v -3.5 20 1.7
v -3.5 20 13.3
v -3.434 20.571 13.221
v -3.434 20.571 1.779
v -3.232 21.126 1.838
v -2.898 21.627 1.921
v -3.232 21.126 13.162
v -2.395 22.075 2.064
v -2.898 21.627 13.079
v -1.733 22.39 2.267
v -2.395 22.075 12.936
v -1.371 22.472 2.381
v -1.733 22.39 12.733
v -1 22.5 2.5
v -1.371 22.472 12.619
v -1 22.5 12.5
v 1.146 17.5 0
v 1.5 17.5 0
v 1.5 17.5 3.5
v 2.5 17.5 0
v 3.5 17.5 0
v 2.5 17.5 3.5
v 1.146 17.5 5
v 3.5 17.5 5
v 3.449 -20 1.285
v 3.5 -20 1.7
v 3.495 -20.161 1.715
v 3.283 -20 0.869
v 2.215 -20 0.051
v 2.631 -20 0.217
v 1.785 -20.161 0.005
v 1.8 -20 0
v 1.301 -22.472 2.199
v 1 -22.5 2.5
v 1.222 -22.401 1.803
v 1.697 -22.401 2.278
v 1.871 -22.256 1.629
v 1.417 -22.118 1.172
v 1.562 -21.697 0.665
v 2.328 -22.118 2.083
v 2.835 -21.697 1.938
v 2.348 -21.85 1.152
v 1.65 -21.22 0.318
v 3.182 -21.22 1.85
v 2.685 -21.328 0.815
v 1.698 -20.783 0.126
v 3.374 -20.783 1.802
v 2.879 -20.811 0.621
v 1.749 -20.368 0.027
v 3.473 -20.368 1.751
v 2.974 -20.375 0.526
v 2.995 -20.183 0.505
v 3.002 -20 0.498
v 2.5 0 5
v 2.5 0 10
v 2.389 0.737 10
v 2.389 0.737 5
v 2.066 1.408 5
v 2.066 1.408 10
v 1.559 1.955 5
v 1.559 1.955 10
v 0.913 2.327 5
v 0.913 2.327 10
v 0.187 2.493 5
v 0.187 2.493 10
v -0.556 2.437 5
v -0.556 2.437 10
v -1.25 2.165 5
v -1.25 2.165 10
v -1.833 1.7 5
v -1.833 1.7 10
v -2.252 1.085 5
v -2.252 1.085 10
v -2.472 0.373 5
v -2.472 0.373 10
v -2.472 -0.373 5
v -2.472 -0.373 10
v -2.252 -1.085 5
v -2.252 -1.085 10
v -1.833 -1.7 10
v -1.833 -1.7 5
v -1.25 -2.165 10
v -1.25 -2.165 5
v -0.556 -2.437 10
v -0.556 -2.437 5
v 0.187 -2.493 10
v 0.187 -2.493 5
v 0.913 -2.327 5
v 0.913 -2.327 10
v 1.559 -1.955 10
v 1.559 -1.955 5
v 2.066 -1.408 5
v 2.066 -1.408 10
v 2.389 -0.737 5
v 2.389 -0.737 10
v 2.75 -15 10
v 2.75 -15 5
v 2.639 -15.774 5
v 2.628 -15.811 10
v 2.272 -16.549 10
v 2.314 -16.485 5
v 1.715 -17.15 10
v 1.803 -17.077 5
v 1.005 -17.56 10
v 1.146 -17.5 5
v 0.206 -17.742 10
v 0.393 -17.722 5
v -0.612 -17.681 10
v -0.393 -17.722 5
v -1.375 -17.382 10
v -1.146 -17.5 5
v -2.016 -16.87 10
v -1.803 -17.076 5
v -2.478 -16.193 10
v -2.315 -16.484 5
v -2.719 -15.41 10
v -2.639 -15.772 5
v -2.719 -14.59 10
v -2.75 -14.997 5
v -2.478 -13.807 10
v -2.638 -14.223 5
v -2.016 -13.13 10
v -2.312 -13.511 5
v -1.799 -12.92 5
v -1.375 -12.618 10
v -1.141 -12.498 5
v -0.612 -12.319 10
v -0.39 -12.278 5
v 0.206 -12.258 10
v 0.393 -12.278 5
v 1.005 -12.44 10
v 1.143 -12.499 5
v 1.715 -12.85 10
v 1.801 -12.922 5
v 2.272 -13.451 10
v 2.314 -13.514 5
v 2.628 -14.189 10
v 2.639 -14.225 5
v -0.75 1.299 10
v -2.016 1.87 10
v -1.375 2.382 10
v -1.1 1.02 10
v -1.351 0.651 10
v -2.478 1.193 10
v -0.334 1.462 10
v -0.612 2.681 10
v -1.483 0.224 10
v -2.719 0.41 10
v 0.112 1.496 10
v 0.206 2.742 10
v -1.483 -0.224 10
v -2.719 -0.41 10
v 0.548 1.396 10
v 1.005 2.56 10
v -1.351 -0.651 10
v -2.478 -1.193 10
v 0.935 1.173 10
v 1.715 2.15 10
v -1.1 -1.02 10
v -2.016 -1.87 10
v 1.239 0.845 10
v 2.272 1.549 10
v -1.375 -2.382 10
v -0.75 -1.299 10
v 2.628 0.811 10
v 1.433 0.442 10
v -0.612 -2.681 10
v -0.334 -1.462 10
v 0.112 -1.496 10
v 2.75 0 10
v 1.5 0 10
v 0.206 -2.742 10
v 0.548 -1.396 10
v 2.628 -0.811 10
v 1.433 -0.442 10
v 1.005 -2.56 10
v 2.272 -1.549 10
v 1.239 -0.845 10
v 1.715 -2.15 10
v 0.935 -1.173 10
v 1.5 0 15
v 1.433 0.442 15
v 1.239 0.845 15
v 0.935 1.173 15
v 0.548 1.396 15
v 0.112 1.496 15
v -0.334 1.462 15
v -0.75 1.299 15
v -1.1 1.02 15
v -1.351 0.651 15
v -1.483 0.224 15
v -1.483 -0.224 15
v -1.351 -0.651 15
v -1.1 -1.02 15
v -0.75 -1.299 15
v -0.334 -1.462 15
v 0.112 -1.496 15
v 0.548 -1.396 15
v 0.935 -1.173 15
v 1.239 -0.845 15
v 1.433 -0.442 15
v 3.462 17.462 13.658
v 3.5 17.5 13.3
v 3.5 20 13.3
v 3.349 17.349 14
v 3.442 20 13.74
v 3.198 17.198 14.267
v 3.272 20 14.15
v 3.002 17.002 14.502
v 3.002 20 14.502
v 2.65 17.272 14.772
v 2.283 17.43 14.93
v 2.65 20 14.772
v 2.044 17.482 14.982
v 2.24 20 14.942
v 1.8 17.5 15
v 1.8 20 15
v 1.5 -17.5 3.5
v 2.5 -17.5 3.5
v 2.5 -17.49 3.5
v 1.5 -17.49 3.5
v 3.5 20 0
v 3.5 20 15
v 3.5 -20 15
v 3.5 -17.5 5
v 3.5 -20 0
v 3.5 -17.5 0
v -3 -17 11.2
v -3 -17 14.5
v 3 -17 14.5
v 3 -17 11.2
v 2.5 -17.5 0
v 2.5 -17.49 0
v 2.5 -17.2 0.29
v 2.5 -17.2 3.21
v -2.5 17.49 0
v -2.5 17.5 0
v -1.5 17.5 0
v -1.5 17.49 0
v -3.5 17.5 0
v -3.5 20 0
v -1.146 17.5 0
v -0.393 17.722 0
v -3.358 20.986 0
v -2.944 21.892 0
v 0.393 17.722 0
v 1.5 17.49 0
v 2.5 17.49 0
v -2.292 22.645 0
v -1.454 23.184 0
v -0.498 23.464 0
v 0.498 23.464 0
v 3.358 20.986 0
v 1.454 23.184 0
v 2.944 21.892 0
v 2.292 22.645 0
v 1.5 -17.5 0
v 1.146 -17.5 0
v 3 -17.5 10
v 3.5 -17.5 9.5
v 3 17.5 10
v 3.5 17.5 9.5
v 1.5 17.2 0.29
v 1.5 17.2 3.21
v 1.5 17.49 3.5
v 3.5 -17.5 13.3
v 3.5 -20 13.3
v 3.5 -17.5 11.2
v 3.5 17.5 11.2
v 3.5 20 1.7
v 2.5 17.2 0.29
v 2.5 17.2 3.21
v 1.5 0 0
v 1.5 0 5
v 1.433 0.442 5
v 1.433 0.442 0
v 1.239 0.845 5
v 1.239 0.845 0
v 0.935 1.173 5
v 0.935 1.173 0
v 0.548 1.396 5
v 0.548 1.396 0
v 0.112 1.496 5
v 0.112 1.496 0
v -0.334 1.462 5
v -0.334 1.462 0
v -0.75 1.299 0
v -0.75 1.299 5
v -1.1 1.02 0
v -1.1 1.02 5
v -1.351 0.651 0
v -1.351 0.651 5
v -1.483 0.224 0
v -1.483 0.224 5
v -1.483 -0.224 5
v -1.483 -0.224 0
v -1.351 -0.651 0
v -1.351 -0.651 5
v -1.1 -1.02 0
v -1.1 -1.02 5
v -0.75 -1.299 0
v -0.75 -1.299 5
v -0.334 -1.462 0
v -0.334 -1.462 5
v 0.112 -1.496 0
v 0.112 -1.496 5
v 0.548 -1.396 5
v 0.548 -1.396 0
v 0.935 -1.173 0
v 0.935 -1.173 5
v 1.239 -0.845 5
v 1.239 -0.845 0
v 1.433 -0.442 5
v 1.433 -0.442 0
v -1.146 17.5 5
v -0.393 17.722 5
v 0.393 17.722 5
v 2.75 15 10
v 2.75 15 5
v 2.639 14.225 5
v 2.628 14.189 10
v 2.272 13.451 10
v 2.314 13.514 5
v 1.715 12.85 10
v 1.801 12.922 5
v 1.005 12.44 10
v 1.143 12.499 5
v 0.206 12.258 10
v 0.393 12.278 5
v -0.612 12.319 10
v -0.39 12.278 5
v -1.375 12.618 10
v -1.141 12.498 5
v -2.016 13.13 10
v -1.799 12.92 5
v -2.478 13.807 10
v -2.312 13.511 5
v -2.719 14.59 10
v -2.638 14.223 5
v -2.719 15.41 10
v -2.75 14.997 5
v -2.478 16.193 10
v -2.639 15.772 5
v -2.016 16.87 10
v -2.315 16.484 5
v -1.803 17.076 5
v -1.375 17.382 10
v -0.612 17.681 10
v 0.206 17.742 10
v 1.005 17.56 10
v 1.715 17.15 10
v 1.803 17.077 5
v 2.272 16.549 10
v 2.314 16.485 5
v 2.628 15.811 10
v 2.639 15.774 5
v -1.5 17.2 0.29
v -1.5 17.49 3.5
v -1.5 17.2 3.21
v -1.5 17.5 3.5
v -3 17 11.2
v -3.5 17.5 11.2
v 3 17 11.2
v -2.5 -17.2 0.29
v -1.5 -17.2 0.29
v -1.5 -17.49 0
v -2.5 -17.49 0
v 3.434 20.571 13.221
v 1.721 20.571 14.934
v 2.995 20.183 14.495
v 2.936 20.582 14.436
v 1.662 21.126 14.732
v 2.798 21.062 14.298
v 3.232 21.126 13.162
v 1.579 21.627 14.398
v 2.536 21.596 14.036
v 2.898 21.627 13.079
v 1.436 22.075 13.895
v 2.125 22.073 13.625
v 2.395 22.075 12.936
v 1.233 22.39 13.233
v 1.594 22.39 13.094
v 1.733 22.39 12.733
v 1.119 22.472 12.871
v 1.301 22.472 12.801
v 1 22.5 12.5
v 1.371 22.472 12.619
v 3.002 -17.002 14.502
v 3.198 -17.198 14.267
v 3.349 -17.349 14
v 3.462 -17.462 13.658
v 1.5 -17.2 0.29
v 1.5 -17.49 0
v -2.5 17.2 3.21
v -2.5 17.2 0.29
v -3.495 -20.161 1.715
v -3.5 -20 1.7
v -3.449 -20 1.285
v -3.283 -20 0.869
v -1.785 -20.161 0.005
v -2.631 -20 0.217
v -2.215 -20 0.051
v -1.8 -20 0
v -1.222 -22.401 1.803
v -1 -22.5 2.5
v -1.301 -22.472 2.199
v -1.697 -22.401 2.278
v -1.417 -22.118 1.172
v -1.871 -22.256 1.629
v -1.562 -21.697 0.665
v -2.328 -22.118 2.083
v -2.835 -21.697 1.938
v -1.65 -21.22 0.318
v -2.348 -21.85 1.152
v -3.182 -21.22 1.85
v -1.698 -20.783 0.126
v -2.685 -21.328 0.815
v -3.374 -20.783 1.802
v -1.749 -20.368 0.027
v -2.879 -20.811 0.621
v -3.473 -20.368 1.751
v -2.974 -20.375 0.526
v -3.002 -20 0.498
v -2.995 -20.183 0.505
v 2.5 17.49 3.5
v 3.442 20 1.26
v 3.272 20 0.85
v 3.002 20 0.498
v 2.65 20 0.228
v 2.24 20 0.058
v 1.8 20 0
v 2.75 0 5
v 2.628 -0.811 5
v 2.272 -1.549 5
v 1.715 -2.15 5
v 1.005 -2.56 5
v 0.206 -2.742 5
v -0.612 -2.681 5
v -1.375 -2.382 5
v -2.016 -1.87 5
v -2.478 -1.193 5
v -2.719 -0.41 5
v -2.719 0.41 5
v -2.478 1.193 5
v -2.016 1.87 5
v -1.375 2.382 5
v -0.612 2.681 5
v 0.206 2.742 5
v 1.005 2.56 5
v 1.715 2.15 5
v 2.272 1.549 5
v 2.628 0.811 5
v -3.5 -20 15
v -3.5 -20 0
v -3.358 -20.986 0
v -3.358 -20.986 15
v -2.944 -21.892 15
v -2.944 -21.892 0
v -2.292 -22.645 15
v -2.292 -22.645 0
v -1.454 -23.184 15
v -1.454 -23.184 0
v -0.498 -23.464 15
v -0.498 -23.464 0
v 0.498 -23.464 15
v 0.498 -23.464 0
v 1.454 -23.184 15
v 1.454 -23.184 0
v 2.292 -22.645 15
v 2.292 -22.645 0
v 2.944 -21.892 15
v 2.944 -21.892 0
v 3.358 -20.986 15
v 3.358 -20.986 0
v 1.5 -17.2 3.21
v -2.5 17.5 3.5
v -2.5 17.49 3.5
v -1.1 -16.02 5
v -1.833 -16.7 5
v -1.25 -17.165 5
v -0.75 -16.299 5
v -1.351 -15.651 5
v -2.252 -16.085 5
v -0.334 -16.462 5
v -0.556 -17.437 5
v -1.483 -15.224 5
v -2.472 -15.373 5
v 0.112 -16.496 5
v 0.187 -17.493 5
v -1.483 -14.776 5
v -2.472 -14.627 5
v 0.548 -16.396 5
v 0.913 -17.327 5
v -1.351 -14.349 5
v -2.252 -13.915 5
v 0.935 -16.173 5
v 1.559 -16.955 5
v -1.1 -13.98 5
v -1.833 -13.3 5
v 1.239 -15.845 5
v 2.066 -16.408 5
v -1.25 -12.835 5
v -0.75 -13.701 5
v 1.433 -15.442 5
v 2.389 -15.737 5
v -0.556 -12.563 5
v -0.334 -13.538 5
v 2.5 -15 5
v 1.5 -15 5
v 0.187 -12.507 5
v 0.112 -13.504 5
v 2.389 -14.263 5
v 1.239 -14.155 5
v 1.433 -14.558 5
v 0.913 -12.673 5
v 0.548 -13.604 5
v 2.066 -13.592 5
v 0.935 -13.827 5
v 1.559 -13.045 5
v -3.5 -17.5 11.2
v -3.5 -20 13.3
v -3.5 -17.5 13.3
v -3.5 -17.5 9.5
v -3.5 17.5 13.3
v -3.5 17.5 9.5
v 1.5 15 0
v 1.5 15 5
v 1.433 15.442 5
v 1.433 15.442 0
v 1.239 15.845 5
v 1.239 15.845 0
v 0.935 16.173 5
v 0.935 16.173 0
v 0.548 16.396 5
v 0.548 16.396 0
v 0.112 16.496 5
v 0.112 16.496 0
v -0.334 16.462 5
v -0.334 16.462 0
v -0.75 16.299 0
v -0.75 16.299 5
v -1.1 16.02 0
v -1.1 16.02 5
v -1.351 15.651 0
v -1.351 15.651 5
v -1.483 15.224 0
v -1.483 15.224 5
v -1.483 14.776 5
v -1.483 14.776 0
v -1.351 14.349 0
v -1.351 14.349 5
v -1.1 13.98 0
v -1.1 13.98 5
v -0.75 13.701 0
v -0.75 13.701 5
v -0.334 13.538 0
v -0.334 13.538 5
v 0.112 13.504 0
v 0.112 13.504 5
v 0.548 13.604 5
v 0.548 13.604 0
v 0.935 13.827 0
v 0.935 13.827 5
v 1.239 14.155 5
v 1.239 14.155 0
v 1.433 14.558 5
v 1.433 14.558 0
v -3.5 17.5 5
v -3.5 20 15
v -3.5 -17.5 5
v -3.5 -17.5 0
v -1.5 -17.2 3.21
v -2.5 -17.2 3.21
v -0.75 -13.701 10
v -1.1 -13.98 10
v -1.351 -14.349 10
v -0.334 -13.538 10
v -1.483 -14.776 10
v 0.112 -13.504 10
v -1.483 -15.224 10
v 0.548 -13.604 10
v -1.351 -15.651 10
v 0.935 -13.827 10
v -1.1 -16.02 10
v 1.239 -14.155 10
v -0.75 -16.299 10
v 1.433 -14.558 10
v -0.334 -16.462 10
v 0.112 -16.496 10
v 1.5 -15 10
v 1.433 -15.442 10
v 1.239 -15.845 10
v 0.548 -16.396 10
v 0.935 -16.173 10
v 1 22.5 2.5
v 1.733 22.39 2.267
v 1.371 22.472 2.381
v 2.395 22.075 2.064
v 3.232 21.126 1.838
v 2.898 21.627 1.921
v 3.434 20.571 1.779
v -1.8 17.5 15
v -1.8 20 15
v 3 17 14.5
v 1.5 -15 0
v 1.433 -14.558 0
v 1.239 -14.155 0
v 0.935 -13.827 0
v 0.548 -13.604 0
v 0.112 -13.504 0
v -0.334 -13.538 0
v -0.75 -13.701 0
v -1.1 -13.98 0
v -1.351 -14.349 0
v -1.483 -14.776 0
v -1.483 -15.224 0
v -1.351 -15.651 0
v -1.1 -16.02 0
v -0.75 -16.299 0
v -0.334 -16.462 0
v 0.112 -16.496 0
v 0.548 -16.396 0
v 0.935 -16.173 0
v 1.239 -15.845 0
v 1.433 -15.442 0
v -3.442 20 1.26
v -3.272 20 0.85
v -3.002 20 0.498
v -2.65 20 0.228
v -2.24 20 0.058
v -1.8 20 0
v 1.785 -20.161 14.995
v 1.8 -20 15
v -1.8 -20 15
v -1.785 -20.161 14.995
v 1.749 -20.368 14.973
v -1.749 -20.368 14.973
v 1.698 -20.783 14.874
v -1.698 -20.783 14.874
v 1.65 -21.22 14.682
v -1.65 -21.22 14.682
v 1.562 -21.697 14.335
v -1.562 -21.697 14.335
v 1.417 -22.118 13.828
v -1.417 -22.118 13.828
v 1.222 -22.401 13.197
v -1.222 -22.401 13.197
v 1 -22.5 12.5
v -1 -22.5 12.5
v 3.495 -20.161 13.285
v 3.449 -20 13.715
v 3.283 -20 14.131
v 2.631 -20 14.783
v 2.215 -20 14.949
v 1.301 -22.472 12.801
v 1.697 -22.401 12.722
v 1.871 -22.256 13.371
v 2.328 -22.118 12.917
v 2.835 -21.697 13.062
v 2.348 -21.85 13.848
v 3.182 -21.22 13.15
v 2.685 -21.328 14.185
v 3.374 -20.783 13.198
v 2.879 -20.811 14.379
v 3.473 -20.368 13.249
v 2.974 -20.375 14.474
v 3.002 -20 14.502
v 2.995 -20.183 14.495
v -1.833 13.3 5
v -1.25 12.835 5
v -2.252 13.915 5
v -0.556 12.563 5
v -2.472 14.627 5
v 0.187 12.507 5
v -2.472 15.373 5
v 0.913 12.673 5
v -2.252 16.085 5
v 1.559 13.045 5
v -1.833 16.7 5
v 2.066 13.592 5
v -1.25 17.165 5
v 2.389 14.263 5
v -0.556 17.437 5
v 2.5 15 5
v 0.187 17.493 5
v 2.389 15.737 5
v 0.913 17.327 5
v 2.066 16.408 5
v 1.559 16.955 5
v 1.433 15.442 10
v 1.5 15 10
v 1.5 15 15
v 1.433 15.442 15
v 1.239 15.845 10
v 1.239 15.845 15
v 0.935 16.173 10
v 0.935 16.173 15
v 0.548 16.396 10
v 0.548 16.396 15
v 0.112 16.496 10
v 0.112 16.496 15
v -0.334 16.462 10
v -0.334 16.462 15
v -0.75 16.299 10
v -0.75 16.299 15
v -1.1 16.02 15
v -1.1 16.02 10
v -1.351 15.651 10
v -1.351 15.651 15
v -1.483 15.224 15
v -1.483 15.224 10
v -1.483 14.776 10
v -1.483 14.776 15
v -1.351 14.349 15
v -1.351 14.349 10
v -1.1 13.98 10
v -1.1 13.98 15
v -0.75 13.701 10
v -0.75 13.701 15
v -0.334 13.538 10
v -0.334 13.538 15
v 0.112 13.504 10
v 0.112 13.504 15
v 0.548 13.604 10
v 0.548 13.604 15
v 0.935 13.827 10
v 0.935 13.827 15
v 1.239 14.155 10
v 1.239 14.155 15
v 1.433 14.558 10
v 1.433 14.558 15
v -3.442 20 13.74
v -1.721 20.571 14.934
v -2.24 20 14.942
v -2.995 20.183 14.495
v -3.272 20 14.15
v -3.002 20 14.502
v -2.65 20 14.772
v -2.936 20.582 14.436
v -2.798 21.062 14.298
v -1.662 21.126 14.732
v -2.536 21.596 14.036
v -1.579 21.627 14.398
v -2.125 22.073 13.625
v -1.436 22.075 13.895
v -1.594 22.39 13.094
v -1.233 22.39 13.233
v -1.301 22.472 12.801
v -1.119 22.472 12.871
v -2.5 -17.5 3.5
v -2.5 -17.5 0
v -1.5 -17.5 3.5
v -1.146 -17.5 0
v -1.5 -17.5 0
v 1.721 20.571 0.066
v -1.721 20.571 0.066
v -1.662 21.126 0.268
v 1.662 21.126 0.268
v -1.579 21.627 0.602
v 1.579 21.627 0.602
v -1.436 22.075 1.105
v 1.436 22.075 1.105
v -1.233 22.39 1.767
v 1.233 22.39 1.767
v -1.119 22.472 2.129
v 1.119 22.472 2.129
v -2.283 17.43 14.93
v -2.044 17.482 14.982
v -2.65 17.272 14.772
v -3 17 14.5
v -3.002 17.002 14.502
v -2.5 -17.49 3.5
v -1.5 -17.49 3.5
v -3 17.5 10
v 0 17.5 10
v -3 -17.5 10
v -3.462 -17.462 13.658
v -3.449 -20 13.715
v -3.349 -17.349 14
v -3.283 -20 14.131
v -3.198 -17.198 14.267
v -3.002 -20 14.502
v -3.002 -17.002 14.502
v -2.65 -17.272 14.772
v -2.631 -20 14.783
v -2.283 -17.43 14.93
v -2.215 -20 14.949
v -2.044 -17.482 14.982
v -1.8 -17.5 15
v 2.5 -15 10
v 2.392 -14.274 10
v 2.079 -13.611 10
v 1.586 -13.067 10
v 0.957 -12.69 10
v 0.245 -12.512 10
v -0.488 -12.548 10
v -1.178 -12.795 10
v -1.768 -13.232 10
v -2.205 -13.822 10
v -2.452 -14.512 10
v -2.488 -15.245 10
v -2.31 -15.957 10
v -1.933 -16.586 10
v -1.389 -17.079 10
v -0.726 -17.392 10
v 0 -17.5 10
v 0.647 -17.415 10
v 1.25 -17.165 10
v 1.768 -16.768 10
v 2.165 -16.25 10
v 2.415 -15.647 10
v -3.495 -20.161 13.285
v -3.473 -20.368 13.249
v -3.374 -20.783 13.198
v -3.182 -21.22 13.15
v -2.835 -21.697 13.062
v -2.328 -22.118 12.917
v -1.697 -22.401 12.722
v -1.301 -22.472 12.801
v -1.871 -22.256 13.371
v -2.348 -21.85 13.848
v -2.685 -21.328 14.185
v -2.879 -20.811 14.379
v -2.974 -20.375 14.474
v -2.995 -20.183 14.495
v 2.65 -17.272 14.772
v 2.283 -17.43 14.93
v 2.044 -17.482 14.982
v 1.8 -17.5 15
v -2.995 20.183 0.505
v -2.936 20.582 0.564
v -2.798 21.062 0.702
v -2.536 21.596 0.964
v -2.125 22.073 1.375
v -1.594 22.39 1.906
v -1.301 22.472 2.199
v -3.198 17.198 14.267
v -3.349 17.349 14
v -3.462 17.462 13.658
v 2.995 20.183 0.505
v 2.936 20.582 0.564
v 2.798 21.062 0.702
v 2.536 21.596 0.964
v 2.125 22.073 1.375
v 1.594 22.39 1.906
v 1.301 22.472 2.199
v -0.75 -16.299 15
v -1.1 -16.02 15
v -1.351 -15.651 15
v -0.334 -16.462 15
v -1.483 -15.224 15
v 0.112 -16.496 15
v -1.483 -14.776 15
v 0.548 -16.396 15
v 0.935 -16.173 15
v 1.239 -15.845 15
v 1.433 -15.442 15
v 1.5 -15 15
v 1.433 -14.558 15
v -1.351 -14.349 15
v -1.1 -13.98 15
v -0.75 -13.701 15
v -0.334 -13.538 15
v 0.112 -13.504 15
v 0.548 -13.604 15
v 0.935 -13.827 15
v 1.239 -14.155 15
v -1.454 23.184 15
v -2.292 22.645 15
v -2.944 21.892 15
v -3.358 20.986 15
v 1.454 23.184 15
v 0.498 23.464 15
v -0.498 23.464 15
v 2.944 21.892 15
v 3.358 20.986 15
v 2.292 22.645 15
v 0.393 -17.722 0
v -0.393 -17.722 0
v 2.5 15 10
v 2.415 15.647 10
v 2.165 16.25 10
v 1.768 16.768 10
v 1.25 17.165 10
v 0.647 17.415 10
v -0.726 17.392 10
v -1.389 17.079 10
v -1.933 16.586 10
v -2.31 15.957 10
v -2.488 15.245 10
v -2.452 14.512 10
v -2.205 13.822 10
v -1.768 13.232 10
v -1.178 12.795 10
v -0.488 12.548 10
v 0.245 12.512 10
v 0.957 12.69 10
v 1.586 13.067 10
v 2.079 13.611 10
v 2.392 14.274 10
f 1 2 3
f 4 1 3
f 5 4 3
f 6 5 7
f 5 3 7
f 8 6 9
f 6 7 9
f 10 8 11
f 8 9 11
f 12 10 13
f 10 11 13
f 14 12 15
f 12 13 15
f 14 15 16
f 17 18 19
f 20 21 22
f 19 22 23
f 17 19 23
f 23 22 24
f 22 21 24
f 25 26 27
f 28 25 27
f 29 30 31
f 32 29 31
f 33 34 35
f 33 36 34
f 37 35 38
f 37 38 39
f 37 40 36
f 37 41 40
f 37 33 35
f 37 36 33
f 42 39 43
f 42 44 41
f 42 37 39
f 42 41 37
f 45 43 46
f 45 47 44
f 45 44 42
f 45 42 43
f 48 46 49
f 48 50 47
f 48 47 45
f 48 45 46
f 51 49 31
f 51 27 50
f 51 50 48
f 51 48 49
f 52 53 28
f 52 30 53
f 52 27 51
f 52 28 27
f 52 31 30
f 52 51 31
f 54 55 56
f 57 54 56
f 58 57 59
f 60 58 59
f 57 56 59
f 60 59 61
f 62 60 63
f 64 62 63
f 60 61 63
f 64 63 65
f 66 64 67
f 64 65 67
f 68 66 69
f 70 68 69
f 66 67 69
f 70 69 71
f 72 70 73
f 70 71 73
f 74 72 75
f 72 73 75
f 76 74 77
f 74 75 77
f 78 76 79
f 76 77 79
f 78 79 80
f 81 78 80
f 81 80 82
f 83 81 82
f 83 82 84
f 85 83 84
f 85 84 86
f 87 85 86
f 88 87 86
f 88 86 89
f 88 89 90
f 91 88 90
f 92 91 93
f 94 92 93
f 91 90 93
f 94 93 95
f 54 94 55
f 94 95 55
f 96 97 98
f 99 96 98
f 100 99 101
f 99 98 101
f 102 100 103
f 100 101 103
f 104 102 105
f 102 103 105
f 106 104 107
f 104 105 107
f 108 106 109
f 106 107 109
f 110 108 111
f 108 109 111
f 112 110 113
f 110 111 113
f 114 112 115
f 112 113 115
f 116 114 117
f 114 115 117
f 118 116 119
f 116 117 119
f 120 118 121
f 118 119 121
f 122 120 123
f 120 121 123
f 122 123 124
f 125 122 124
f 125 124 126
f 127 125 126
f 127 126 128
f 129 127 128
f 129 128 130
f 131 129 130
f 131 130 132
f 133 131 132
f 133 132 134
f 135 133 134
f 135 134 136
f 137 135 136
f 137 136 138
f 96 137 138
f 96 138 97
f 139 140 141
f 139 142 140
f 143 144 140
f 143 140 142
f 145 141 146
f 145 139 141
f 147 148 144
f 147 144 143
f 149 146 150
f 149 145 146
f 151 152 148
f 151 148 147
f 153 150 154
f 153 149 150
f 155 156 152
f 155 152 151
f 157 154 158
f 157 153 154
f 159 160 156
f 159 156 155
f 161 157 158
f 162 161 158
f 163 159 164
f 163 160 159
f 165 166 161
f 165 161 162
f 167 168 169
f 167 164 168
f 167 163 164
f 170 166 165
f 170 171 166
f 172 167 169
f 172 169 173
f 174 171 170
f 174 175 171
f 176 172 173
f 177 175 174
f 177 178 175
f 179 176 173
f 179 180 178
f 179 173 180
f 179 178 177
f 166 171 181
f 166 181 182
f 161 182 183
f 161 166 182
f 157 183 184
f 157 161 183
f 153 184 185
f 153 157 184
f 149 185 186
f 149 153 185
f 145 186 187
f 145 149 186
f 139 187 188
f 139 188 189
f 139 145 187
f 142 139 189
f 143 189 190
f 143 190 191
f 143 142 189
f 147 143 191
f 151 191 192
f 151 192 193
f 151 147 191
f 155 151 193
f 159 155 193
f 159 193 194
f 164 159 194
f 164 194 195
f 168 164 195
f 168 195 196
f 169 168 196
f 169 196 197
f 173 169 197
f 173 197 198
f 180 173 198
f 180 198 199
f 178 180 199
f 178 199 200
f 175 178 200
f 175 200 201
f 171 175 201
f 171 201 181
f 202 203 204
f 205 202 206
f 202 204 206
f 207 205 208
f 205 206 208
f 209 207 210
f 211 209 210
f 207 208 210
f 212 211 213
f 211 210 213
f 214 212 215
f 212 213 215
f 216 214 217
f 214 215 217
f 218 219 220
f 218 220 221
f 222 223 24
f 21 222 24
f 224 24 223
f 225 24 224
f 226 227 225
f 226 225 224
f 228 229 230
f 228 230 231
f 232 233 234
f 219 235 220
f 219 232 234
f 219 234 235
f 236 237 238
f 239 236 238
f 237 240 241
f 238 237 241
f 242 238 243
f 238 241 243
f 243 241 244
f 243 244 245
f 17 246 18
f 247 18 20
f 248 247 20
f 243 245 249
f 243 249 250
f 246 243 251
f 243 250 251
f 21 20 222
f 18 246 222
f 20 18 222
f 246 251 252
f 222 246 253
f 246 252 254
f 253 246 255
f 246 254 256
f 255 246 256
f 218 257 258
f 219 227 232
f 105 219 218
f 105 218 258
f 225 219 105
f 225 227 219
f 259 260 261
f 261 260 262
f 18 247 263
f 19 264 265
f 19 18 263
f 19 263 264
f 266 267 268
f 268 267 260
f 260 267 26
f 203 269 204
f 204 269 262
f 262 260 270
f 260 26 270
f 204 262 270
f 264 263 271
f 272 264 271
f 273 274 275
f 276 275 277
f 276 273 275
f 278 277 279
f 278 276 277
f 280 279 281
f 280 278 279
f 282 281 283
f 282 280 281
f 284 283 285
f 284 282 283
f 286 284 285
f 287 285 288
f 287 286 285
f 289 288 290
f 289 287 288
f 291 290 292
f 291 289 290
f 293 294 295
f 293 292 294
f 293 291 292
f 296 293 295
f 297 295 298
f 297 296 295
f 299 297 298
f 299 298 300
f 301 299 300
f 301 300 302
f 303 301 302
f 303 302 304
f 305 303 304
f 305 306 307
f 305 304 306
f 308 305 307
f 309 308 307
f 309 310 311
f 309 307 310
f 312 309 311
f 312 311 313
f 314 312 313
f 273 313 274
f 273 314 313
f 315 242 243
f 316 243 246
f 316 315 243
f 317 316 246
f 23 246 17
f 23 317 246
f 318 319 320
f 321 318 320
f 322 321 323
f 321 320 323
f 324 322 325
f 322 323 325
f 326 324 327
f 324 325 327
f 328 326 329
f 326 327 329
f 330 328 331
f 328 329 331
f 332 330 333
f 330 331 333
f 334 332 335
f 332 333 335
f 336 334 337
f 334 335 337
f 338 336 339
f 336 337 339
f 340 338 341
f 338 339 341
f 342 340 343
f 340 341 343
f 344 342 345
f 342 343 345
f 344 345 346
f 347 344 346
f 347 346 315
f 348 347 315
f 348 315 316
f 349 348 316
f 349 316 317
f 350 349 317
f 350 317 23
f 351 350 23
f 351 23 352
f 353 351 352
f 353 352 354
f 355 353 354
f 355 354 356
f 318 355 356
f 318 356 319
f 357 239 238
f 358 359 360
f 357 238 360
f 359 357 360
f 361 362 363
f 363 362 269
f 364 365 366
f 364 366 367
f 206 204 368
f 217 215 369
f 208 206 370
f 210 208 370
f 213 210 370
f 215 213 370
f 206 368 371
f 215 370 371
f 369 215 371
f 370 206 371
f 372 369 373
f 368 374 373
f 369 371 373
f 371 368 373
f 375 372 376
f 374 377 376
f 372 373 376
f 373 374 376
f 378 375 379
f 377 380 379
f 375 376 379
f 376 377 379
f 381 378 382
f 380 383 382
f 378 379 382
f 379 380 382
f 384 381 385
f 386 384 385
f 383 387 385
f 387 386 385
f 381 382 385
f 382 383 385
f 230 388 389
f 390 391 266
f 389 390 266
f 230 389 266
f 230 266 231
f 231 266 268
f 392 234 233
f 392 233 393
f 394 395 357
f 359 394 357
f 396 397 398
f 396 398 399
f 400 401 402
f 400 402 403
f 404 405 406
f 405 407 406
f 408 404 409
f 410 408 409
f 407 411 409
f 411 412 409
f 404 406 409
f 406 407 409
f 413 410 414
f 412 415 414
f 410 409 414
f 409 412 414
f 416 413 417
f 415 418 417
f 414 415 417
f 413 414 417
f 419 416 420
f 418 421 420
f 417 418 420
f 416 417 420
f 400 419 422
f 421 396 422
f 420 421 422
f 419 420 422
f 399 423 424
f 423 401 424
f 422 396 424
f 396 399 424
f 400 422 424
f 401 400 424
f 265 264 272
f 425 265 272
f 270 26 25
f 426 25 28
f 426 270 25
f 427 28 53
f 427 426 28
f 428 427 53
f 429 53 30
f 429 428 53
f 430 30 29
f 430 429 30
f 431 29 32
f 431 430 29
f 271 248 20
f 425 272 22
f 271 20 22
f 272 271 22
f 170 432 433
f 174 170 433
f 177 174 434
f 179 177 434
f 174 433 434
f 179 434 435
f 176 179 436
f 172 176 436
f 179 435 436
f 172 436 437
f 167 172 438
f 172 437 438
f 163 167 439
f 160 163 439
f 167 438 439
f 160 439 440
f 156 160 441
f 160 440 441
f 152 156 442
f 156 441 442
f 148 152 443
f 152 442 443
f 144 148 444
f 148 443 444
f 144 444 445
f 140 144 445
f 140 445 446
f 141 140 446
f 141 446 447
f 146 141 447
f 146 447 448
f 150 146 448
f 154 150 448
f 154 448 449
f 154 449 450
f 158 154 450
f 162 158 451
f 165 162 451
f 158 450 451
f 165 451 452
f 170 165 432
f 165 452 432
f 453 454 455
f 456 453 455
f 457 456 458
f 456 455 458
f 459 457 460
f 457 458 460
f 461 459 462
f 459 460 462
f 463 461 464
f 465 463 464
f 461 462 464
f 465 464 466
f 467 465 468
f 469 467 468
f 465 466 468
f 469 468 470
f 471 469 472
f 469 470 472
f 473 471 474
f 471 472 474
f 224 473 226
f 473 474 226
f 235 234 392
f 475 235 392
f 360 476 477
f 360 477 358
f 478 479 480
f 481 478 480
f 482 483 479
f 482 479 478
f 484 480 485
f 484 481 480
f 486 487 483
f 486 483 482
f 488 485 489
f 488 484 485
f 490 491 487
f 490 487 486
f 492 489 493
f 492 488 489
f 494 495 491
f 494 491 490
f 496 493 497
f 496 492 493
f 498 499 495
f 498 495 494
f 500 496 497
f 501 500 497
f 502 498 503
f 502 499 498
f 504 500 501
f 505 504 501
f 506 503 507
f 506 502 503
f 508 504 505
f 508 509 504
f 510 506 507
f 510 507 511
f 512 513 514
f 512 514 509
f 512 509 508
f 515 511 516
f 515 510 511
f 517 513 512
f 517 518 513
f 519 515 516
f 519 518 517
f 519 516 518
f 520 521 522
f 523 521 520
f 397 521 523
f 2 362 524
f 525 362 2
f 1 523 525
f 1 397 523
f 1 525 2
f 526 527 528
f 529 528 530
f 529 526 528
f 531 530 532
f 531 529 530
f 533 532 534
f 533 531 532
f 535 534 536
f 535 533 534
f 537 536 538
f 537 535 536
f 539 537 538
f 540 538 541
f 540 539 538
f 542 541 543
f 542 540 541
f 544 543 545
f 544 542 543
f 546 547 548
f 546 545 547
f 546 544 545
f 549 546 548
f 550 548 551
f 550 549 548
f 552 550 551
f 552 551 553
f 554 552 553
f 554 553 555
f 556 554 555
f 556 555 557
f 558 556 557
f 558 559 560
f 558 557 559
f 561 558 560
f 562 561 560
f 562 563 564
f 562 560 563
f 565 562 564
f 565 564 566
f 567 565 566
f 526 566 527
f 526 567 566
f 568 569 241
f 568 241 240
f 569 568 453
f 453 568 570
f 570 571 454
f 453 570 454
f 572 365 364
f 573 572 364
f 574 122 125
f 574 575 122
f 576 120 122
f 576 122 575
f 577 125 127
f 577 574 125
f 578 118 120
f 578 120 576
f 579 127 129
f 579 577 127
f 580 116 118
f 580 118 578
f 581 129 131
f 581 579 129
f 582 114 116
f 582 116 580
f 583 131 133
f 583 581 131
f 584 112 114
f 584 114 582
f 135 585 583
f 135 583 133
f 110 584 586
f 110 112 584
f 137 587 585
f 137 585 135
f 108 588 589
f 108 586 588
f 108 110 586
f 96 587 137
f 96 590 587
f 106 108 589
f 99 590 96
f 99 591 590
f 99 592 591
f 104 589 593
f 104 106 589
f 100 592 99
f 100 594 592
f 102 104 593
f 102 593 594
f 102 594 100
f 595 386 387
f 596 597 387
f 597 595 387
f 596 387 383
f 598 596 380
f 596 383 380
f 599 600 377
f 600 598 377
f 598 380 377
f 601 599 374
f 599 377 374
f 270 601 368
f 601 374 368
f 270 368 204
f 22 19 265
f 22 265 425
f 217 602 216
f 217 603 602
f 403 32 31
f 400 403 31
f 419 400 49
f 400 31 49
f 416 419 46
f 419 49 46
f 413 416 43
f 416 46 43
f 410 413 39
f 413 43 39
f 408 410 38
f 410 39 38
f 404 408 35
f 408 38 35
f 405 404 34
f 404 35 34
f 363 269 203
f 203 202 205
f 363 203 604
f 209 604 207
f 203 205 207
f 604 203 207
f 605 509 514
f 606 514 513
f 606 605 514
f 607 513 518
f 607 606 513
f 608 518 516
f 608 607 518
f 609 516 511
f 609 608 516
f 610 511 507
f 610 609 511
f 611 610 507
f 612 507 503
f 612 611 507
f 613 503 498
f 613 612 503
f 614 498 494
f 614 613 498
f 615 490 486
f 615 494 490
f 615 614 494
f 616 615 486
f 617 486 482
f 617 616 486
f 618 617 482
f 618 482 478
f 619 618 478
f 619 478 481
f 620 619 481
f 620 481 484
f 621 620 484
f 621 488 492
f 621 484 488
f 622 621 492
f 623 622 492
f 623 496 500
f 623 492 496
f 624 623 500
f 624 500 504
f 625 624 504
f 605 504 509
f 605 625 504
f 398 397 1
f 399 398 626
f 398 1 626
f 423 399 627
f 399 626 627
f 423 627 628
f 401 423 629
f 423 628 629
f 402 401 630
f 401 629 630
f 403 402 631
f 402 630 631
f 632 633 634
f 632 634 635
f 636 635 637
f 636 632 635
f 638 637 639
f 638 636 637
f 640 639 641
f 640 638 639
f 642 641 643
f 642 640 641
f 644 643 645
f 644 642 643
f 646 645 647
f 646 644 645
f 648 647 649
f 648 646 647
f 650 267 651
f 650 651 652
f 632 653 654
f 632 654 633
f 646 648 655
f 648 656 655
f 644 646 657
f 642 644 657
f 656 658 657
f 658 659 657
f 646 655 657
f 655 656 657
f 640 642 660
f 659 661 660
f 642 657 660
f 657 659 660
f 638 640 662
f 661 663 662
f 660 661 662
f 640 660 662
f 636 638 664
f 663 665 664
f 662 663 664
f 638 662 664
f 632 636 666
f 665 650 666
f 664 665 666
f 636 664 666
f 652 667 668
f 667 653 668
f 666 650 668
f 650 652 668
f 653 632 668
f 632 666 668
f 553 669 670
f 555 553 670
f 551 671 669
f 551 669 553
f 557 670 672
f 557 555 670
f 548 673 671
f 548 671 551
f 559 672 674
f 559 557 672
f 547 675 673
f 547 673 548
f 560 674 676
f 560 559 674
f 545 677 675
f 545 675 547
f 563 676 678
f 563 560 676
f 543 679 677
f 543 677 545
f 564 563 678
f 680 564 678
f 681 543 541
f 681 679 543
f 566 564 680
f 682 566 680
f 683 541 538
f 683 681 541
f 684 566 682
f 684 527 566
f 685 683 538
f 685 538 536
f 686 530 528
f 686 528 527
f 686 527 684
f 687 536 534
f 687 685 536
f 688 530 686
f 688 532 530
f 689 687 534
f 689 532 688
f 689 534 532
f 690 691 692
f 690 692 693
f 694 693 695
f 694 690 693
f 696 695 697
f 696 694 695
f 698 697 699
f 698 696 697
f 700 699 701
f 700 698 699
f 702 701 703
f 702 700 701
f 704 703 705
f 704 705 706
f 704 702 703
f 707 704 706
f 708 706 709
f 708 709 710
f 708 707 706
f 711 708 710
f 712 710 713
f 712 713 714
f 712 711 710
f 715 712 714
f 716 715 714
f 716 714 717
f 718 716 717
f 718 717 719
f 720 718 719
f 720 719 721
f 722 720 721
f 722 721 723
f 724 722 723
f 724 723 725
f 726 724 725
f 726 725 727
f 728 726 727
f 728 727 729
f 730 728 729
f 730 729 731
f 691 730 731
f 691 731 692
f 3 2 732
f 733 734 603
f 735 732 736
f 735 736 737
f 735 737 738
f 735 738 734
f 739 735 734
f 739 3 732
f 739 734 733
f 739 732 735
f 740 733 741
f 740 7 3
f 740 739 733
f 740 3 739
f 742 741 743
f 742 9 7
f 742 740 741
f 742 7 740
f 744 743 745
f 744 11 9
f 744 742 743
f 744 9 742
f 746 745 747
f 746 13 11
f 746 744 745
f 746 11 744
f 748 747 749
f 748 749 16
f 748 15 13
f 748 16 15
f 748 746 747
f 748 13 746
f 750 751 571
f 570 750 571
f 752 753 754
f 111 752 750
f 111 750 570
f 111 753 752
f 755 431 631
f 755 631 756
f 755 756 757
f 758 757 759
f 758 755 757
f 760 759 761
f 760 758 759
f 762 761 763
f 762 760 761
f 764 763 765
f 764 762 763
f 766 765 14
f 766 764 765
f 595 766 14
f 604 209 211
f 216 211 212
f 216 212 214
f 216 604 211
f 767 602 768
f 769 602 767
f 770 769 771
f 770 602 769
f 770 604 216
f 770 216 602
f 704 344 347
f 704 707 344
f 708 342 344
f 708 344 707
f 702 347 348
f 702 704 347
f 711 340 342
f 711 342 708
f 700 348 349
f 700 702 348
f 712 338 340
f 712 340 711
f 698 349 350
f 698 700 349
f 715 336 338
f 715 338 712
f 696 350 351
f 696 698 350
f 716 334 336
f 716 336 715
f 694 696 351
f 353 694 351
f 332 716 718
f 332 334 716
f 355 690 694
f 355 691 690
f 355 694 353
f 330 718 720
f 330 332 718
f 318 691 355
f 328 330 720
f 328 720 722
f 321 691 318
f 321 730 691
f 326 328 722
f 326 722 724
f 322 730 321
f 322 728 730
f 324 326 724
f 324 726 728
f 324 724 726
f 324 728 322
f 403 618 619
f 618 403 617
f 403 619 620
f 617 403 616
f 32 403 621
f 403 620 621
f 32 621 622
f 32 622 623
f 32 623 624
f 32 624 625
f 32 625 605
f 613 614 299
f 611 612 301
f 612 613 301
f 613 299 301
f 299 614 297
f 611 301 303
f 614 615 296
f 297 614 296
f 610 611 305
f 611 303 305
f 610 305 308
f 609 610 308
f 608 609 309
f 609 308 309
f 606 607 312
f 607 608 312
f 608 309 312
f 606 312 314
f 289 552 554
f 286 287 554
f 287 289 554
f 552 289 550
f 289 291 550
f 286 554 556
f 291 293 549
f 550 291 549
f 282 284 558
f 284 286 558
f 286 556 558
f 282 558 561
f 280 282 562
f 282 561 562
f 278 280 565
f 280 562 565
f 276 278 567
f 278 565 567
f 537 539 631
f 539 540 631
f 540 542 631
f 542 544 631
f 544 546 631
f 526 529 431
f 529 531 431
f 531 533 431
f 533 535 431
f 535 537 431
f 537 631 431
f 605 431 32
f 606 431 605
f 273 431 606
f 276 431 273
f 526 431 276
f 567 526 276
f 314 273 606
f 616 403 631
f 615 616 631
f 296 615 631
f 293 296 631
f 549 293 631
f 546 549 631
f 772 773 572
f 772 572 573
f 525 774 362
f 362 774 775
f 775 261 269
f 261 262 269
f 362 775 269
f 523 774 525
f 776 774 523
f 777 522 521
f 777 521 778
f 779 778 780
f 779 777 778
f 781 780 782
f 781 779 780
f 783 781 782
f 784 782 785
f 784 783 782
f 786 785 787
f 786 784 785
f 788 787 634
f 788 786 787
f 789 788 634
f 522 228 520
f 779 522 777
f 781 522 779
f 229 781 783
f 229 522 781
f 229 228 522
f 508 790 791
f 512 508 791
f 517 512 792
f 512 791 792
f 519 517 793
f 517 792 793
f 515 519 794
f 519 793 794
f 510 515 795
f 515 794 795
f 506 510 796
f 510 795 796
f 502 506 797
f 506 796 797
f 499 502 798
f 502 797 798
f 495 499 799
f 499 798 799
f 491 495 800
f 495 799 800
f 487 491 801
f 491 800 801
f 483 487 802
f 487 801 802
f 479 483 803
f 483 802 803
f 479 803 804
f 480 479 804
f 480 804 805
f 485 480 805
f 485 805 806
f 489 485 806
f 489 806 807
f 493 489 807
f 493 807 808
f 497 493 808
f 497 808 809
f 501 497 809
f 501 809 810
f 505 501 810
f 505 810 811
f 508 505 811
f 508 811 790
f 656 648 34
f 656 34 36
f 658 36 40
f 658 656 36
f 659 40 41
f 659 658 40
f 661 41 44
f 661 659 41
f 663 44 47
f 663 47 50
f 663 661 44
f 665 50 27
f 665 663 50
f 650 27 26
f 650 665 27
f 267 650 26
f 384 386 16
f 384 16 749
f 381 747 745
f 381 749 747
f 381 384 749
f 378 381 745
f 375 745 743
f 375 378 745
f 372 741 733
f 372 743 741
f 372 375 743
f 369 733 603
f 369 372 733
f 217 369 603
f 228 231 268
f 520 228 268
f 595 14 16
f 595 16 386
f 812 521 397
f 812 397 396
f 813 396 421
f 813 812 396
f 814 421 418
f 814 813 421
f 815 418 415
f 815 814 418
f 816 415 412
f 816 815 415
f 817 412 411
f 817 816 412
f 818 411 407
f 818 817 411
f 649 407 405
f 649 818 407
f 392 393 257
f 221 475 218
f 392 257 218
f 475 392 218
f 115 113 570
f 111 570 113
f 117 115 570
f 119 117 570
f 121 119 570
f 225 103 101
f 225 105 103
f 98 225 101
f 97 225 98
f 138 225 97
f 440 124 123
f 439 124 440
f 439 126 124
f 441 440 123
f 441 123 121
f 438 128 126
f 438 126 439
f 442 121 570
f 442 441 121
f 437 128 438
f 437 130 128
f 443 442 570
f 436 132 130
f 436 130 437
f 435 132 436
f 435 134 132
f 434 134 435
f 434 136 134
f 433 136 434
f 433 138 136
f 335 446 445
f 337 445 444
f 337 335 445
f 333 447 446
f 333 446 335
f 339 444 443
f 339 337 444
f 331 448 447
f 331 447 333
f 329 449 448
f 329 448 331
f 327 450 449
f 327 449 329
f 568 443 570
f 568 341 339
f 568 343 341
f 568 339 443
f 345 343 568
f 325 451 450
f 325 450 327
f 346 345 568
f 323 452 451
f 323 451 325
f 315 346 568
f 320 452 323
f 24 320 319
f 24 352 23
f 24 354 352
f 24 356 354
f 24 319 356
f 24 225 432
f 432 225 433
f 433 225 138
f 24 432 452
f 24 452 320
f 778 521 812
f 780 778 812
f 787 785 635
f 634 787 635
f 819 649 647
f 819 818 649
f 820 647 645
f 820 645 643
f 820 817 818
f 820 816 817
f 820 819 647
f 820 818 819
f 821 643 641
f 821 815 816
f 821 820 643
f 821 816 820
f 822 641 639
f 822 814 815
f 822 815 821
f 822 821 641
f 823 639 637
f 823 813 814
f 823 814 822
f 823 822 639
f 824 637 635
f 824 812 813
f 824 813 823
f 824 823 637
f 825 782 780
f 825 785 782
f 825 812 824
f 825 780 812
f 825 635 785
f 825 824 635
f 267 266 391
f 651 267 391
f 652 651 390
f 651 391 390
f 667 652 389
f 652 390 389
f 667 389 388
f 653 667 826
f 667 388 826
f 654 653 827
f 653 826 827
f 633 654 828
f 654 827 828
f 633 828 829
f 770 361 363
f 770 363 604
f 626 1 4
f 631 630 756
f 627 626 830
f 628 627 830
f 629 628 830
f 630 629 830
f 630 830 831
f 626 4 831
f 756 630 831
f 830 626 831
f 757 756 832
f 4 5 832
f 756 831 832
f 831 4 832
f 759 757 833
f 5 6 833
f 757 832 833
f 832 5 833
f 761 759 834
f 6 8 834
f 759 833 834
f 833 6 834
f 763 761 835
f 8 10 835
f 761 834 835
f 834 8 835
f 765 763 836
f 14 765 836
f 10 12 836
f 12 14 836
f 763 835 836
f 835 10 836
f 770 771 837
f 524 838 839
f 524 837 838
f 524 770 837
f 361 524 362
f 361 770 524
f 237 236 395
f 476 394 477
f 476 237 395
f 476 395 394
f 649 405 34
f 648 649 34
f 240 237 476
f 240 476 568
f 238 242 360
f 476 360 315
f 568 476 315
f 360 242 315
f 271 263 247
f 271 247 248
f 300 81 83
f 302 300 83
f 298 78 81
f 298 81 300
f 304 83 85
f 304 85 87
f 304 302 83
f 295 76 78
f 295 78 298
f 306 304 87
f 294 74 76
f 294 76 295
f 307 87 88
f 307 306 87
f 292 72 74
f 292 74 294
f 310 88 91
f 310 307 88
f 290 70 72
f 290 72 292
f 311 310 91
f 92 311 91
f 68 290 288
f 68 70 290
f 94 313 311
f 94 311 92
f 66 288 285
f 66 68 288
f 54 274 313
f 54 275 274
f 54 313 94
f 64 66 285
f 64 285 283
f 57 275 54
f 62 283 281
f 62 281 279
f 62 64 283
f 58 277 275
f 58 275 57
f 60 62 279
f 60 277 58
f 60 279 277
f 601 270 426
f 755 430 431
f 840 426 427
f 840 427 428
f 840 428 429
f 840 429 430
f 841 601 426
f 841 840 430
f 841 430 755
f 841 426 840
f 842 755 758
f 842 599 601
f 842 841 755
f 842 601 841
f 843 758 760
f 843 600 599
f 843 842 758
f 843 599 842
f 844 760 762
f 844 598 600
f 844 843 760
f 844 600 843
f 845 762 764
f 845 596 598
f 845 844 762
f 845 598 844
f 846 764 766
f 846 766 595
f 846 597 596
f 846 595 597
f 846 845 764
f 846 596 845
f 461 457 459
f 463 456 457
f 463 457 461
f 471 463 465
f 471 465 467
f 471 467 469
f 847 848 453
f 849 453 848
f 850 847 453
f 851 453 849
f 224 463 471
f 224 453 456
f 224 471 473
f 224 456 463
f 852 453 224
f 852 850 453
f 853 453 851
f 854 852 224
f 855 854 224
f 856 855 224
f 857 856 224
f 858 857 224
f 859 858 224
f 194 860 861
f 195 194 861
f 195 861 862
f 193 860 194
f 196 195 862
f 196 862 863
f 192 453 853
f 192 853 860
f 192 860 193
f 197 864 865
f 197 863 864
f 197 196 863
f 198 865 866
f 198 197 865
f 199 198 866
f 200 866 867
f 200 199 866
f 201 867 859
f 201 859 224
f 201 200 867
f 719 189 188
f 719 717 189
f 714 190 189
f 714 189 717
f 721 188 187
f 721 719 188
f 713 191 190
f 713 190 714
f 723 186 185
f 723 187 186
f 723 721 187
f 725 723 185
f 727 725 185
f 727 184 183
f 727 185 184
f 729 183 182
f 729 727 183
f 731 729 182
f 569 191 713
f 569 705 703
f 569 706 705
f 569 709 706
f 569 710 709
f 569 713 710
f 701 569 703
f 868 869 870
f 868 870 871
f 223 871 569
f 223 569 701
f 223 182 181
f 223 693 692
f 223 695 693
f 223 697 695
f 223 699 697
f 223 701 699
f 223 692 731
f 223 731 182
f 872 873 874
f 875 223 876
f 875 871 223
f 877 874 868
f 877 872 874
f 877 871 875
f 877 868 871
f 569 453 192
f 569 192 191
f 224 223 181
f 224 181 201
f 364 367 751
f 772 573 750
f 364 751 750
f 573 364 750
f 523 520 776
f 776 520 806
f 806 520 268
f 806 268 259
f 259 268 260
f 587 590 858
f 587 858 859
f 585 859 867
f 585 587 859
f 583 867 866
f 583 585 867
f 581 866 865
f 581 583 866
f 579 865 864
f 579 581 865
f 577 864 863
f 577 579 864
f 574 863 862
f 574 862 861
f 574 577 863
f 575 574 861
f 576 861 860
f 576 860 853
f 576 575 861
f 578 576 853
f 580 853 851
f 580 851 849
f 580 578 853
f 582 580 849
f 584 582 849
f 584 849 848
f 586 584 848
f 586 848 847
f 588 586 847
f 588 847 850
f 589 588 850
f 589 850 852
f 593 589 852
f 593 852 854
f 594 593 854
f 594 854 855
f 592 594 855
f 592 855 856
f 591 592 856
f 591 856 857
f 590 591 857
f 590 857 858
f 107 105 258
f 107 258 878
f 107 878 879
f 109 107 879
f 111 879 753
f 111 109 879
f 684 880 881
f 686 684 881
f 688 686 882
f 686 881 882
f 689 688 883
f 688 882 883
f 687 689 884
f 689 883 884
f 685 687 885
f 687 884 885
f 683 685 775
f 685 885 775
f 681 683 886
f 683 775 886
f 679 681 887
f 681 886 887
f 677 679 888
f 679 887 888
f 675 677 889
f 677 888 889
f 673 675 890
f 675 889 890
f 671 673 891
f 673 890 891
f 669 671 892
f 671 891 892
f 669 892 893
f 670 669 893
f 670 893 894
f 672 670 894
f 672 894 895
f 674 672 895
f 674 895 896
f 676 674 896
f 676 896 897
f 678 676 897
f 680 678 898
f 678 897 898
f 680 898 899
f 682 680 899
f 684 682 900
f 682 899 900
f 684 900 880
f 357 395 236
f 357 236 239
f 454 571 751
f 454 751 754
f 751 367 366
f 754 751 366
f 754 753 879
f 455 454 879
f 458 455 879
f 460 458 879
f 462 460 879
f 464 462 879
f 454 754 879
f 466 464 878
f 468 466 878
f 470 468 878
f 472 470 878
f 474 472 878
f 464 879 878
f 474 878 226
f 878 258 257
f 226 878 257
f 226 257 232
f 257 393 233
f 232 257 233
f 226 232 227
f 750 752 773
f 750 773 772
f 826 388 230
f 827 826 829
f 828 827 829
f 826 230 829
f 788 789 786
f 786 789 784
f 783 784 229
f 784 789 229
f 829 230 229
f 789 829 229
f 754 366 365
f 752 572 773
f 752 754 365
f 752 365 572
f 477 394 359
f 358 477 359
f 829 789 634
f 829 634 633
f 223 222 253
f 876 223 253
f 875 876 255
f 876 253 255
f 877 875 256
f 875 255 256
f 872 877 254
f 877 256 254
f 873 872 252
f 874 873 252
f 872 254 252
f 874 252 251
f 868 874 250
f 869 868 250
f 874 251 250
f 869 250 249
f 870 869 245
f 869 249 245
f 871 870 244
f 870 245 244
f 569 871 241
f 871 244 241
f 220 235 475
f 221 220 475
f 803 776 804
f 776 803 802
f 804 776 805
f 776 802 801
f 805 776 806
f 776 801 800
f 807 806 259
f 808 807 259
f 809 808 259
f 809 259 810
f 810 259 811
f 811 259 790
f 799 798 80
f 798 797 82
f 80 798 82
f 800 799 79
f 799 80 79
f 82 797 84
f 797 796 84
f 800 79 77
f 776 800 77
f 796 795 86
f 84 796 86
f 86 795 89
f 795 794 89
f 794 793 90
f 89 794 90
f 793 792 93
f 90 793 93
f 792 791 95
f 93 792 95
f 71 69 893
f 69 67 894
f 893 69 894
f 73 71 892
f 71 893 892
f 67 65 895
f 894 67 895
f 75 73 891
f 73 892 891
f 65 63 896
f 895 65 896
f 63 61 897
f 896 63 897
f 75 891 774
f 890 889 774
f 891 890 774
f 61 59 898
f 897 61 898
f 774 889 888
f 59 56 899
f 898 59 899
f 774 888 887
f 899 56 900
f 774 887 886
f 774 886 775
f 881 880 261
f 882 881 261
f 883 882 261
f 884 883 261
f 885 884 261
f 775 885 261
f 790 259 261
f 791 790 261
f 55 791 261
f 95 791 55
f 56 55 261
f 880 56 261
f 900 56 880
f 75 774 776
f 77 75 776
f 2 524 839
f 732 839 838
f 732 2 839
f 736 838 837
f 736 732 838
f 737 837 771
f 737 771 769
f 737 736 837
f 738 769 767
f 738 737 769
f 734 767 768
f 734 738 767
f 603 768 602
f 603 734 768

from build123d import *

# Parameters (mm, degrees)
SKETCH_W             = 7
SKETCH_H             = 45
SKETCH_R             = 1.5
PAD_DEPTH            = 15
POCKET_DEPTH         = 7.001
FILLET_R             = 2.5
CHAMFER_SIZE         = 0.5
FILLET001_R          = 1.7
SKETCH002_R          = 2.5
POCKET001_DEPTH      = 5
SKETCH003_R          = 1.5
PAD001_DEPTH         = 15
SKETCH004_W          = 35
SKETCH004_H          = 5
POCKET002_DEPTH      = 7.001
SKETCH005_R          = 2.75
POCKET003_DEPTH      = 5
POCKET003_DEPTH_BACK = -5
SKETCH006_W          = 1
SKETCH006_H          = 3.5
PAD002_DEPTH         = 0.3
SKETCH007_W          = 1
SKETCH007_H          = 3.5
PAD003_DEPTH         = 0.3
CHAMFER001_SIZE      = 0.29


with BuildPart() as body:
    # Sketch → Pad (new body)
    with BuildSketch(Plane.XY):
        Rectangle(SKETCH_W, SKETCH_H)
        Circle(SKETCH_R, mode=Mode.SUBTRACT)
        with Locations((0, 15)):
            Circle(SKETCH_R, mode=Mode.SUBTRACT)
        with Locations((0, -15)):
            Circle(SKETCH_R, mode=Mode.SUBTRACT)
    extrude(amount=PAD_DEPTH)

    # Sketch001 (on Face3 of Pad) → Pocket (cut, through all)
    with BuildSketch(Plane.YZ.offset(3.5)):
        Polygon((-17.5, 10), (17.5, 10), (17.5, 11.2), (17, 11.2), (17, 15), (-17, 15), (-17, 11.2), (-17.5, 11.2), align=None)
    extrude(amount=-POCKET_DEPTH, mode=Mode.SUBTRACT)

    # Fillet
    fillet_edges = [body.edges().sort_by_distance(p)[0] for p in [
        (3.5, 22.5, 7.5),
        (-3.5, 22.5, 7.5),
        (0, 22.5, 0),
        (0, 22.5, 15),
        (-3.5, -22.5, 7.5),
        (3.5, -22.5, 7.5),
        (0, -22.5, 0),
        (0, -22.5, 15),
    ]]
    fillet(fillet_edges, radius=FILLET_R)

    # Chamfer
    chamfer_edges = [body.edges().sort_by_distance(p)[0] for p in [
        (-3.5, -17, 13.1),
        (3.5, -17, 13.1),
        (0, -17, 15),
        (3.5, 17, 13.1),
        (0, 17, 15),
        (-3.5, 17, 13.1),
        (3.5, 0, 10),
        (-3.5, 0, 10),
    ]]
    chamfer(chamfer_edges, length=CHAMFER_SIZE)

    # Fillet001
    fillet001_edges = [body.edges().sort_by_distance(p)[0] for p in [
        (-3.5, 0, 0),
        (3.5, 0, 0),
        (-3.5, -18.75, 15),
        (3.5, -18.75, 15),
        (-3.5, 18.75, 15),
        (3.5, 18.75, 15),
    ]]
    fillet(fillet001_edges, radius=FILLET001_R)

    # Sketch002 (on Face19 of Chamfer) → Pocket001 (cut)
    with BuildSketch(Plane.XY.offset(10)):
        with Locations((0, -15)):
            Circle(SKETCH002_R)
        Circle(SKETCH002_R)
        with Locations((0, 15)):
            Circle(SKETCH002_R)
    extrude(amount=-POCKET001_DEPTH, mode=Mode.SUBTRACT)


with BuildPart() as body001:
    # Sketch003 → Pad001 (new body)
    with BuildSketch(Plane.XY):
        with BuildLine():
            ThreePointArc((3.5, 20), (0, 23.5), (-3.5, 20))
            Line((-3.5, 20), (-3.5, -20))
            ThreePointArc((-3.5, -20), (0, -23.5), (3.5, -20))
            Line((3.5, 20), (3.5, -20))
        make_face()
        with Locations((0, 15)):
            Circle(SKETCH003_R, mode=Mode.SUBTRACT)
        Circle(SKETCH003_R, mode=Mode.SUBTRACT)
        with Locations((0, -15)):
            Circle(SKETCH003_R, mode=Mode.SUBTRACT)
    extrude(amount=PAD001_DEPTH)

    # Sketch004 (on Face4 of Pad001) → Pocket002 (cut, through all)
    with BuildSketch(Plane.YZ.offset(3.5)):
        with Locations((0, 2.5)):
            Rectangle(SKETCH004_W, SKETCH004_H)
    extrude(amount=-POCKET002_DEPTH, mode=Mode.SUBTRACT)

    # Sketch005 (on Face7 of Pocket002) → Pocket003 (cut, two sides)
    with BuildSketch(Plane(origin=(0, 0, 5), x_dir=(1, 0, 0), z_dir=(0, 0, -1))) as pocket003_sk:
        with Locations((0, 15)):
            Circle(SKETCH005_R)
        Circle(SKETCH005_R)
        with Locations((0, -15)):
            Circle(SKETCH005_R)
    extrude(amount=-POCKET003_DEPTH, mode=Mode.SUBTRACT)
    extrude(pocket003_sk.sketch, amount=-POCKET003_DEPTH_BACK, mode=Mode.SUBTRACT)

    # Sketch006 (on Face12 of Pocket003) → Pad002 (join)
    with BuildSketch(Plane(origin=(0, -17.5, 0), x_dir=(-1, 0, 0), z_dir=(0, 1, 0))):
        with Locations((-2, 1.75)):
            Rectangle(SKETCH006_W, SKETCH006_H)
        with Locations((2, 1.75)):
            Rectangle(SKETCH006_W, SKETCH006_H)
    extrude(amount=PAD002_DEPTH)

    # Sketch007 (on Face10 of Pad002) → Pad003 (join)
    with BuildSketch(Plane.XZ.offset(-17.5)):
        with Locations((-2, 1.75)):
            Rectangle(SKETCH007_W, SKETCH007_H)
        with Locations((2, 1.75)):
            Rectangle(SKETCH007_W, SKETCH007_H)
    extrude(amount=PAD003_DEPTH)

    # Chamfer001
    chamfer001_edges = [body001.edges().sort_by_distance(p)[0] for p in [
        (-2, 17.2, 0),
        (-2, 17.2, 3.5),
        (2, 17.2, 3.5),
        (2, 17.2, 0),
        (-2, -17.2, 0),
        (-2, -17.2, 3.5),
        (2, -17.2, 3.5),
        (2, -17.2, 0),
    ]]
    chamfer(chamfer001_edges, length=CHAMFER001_SIZE)


solid = Compound([body.part, body001.part])
